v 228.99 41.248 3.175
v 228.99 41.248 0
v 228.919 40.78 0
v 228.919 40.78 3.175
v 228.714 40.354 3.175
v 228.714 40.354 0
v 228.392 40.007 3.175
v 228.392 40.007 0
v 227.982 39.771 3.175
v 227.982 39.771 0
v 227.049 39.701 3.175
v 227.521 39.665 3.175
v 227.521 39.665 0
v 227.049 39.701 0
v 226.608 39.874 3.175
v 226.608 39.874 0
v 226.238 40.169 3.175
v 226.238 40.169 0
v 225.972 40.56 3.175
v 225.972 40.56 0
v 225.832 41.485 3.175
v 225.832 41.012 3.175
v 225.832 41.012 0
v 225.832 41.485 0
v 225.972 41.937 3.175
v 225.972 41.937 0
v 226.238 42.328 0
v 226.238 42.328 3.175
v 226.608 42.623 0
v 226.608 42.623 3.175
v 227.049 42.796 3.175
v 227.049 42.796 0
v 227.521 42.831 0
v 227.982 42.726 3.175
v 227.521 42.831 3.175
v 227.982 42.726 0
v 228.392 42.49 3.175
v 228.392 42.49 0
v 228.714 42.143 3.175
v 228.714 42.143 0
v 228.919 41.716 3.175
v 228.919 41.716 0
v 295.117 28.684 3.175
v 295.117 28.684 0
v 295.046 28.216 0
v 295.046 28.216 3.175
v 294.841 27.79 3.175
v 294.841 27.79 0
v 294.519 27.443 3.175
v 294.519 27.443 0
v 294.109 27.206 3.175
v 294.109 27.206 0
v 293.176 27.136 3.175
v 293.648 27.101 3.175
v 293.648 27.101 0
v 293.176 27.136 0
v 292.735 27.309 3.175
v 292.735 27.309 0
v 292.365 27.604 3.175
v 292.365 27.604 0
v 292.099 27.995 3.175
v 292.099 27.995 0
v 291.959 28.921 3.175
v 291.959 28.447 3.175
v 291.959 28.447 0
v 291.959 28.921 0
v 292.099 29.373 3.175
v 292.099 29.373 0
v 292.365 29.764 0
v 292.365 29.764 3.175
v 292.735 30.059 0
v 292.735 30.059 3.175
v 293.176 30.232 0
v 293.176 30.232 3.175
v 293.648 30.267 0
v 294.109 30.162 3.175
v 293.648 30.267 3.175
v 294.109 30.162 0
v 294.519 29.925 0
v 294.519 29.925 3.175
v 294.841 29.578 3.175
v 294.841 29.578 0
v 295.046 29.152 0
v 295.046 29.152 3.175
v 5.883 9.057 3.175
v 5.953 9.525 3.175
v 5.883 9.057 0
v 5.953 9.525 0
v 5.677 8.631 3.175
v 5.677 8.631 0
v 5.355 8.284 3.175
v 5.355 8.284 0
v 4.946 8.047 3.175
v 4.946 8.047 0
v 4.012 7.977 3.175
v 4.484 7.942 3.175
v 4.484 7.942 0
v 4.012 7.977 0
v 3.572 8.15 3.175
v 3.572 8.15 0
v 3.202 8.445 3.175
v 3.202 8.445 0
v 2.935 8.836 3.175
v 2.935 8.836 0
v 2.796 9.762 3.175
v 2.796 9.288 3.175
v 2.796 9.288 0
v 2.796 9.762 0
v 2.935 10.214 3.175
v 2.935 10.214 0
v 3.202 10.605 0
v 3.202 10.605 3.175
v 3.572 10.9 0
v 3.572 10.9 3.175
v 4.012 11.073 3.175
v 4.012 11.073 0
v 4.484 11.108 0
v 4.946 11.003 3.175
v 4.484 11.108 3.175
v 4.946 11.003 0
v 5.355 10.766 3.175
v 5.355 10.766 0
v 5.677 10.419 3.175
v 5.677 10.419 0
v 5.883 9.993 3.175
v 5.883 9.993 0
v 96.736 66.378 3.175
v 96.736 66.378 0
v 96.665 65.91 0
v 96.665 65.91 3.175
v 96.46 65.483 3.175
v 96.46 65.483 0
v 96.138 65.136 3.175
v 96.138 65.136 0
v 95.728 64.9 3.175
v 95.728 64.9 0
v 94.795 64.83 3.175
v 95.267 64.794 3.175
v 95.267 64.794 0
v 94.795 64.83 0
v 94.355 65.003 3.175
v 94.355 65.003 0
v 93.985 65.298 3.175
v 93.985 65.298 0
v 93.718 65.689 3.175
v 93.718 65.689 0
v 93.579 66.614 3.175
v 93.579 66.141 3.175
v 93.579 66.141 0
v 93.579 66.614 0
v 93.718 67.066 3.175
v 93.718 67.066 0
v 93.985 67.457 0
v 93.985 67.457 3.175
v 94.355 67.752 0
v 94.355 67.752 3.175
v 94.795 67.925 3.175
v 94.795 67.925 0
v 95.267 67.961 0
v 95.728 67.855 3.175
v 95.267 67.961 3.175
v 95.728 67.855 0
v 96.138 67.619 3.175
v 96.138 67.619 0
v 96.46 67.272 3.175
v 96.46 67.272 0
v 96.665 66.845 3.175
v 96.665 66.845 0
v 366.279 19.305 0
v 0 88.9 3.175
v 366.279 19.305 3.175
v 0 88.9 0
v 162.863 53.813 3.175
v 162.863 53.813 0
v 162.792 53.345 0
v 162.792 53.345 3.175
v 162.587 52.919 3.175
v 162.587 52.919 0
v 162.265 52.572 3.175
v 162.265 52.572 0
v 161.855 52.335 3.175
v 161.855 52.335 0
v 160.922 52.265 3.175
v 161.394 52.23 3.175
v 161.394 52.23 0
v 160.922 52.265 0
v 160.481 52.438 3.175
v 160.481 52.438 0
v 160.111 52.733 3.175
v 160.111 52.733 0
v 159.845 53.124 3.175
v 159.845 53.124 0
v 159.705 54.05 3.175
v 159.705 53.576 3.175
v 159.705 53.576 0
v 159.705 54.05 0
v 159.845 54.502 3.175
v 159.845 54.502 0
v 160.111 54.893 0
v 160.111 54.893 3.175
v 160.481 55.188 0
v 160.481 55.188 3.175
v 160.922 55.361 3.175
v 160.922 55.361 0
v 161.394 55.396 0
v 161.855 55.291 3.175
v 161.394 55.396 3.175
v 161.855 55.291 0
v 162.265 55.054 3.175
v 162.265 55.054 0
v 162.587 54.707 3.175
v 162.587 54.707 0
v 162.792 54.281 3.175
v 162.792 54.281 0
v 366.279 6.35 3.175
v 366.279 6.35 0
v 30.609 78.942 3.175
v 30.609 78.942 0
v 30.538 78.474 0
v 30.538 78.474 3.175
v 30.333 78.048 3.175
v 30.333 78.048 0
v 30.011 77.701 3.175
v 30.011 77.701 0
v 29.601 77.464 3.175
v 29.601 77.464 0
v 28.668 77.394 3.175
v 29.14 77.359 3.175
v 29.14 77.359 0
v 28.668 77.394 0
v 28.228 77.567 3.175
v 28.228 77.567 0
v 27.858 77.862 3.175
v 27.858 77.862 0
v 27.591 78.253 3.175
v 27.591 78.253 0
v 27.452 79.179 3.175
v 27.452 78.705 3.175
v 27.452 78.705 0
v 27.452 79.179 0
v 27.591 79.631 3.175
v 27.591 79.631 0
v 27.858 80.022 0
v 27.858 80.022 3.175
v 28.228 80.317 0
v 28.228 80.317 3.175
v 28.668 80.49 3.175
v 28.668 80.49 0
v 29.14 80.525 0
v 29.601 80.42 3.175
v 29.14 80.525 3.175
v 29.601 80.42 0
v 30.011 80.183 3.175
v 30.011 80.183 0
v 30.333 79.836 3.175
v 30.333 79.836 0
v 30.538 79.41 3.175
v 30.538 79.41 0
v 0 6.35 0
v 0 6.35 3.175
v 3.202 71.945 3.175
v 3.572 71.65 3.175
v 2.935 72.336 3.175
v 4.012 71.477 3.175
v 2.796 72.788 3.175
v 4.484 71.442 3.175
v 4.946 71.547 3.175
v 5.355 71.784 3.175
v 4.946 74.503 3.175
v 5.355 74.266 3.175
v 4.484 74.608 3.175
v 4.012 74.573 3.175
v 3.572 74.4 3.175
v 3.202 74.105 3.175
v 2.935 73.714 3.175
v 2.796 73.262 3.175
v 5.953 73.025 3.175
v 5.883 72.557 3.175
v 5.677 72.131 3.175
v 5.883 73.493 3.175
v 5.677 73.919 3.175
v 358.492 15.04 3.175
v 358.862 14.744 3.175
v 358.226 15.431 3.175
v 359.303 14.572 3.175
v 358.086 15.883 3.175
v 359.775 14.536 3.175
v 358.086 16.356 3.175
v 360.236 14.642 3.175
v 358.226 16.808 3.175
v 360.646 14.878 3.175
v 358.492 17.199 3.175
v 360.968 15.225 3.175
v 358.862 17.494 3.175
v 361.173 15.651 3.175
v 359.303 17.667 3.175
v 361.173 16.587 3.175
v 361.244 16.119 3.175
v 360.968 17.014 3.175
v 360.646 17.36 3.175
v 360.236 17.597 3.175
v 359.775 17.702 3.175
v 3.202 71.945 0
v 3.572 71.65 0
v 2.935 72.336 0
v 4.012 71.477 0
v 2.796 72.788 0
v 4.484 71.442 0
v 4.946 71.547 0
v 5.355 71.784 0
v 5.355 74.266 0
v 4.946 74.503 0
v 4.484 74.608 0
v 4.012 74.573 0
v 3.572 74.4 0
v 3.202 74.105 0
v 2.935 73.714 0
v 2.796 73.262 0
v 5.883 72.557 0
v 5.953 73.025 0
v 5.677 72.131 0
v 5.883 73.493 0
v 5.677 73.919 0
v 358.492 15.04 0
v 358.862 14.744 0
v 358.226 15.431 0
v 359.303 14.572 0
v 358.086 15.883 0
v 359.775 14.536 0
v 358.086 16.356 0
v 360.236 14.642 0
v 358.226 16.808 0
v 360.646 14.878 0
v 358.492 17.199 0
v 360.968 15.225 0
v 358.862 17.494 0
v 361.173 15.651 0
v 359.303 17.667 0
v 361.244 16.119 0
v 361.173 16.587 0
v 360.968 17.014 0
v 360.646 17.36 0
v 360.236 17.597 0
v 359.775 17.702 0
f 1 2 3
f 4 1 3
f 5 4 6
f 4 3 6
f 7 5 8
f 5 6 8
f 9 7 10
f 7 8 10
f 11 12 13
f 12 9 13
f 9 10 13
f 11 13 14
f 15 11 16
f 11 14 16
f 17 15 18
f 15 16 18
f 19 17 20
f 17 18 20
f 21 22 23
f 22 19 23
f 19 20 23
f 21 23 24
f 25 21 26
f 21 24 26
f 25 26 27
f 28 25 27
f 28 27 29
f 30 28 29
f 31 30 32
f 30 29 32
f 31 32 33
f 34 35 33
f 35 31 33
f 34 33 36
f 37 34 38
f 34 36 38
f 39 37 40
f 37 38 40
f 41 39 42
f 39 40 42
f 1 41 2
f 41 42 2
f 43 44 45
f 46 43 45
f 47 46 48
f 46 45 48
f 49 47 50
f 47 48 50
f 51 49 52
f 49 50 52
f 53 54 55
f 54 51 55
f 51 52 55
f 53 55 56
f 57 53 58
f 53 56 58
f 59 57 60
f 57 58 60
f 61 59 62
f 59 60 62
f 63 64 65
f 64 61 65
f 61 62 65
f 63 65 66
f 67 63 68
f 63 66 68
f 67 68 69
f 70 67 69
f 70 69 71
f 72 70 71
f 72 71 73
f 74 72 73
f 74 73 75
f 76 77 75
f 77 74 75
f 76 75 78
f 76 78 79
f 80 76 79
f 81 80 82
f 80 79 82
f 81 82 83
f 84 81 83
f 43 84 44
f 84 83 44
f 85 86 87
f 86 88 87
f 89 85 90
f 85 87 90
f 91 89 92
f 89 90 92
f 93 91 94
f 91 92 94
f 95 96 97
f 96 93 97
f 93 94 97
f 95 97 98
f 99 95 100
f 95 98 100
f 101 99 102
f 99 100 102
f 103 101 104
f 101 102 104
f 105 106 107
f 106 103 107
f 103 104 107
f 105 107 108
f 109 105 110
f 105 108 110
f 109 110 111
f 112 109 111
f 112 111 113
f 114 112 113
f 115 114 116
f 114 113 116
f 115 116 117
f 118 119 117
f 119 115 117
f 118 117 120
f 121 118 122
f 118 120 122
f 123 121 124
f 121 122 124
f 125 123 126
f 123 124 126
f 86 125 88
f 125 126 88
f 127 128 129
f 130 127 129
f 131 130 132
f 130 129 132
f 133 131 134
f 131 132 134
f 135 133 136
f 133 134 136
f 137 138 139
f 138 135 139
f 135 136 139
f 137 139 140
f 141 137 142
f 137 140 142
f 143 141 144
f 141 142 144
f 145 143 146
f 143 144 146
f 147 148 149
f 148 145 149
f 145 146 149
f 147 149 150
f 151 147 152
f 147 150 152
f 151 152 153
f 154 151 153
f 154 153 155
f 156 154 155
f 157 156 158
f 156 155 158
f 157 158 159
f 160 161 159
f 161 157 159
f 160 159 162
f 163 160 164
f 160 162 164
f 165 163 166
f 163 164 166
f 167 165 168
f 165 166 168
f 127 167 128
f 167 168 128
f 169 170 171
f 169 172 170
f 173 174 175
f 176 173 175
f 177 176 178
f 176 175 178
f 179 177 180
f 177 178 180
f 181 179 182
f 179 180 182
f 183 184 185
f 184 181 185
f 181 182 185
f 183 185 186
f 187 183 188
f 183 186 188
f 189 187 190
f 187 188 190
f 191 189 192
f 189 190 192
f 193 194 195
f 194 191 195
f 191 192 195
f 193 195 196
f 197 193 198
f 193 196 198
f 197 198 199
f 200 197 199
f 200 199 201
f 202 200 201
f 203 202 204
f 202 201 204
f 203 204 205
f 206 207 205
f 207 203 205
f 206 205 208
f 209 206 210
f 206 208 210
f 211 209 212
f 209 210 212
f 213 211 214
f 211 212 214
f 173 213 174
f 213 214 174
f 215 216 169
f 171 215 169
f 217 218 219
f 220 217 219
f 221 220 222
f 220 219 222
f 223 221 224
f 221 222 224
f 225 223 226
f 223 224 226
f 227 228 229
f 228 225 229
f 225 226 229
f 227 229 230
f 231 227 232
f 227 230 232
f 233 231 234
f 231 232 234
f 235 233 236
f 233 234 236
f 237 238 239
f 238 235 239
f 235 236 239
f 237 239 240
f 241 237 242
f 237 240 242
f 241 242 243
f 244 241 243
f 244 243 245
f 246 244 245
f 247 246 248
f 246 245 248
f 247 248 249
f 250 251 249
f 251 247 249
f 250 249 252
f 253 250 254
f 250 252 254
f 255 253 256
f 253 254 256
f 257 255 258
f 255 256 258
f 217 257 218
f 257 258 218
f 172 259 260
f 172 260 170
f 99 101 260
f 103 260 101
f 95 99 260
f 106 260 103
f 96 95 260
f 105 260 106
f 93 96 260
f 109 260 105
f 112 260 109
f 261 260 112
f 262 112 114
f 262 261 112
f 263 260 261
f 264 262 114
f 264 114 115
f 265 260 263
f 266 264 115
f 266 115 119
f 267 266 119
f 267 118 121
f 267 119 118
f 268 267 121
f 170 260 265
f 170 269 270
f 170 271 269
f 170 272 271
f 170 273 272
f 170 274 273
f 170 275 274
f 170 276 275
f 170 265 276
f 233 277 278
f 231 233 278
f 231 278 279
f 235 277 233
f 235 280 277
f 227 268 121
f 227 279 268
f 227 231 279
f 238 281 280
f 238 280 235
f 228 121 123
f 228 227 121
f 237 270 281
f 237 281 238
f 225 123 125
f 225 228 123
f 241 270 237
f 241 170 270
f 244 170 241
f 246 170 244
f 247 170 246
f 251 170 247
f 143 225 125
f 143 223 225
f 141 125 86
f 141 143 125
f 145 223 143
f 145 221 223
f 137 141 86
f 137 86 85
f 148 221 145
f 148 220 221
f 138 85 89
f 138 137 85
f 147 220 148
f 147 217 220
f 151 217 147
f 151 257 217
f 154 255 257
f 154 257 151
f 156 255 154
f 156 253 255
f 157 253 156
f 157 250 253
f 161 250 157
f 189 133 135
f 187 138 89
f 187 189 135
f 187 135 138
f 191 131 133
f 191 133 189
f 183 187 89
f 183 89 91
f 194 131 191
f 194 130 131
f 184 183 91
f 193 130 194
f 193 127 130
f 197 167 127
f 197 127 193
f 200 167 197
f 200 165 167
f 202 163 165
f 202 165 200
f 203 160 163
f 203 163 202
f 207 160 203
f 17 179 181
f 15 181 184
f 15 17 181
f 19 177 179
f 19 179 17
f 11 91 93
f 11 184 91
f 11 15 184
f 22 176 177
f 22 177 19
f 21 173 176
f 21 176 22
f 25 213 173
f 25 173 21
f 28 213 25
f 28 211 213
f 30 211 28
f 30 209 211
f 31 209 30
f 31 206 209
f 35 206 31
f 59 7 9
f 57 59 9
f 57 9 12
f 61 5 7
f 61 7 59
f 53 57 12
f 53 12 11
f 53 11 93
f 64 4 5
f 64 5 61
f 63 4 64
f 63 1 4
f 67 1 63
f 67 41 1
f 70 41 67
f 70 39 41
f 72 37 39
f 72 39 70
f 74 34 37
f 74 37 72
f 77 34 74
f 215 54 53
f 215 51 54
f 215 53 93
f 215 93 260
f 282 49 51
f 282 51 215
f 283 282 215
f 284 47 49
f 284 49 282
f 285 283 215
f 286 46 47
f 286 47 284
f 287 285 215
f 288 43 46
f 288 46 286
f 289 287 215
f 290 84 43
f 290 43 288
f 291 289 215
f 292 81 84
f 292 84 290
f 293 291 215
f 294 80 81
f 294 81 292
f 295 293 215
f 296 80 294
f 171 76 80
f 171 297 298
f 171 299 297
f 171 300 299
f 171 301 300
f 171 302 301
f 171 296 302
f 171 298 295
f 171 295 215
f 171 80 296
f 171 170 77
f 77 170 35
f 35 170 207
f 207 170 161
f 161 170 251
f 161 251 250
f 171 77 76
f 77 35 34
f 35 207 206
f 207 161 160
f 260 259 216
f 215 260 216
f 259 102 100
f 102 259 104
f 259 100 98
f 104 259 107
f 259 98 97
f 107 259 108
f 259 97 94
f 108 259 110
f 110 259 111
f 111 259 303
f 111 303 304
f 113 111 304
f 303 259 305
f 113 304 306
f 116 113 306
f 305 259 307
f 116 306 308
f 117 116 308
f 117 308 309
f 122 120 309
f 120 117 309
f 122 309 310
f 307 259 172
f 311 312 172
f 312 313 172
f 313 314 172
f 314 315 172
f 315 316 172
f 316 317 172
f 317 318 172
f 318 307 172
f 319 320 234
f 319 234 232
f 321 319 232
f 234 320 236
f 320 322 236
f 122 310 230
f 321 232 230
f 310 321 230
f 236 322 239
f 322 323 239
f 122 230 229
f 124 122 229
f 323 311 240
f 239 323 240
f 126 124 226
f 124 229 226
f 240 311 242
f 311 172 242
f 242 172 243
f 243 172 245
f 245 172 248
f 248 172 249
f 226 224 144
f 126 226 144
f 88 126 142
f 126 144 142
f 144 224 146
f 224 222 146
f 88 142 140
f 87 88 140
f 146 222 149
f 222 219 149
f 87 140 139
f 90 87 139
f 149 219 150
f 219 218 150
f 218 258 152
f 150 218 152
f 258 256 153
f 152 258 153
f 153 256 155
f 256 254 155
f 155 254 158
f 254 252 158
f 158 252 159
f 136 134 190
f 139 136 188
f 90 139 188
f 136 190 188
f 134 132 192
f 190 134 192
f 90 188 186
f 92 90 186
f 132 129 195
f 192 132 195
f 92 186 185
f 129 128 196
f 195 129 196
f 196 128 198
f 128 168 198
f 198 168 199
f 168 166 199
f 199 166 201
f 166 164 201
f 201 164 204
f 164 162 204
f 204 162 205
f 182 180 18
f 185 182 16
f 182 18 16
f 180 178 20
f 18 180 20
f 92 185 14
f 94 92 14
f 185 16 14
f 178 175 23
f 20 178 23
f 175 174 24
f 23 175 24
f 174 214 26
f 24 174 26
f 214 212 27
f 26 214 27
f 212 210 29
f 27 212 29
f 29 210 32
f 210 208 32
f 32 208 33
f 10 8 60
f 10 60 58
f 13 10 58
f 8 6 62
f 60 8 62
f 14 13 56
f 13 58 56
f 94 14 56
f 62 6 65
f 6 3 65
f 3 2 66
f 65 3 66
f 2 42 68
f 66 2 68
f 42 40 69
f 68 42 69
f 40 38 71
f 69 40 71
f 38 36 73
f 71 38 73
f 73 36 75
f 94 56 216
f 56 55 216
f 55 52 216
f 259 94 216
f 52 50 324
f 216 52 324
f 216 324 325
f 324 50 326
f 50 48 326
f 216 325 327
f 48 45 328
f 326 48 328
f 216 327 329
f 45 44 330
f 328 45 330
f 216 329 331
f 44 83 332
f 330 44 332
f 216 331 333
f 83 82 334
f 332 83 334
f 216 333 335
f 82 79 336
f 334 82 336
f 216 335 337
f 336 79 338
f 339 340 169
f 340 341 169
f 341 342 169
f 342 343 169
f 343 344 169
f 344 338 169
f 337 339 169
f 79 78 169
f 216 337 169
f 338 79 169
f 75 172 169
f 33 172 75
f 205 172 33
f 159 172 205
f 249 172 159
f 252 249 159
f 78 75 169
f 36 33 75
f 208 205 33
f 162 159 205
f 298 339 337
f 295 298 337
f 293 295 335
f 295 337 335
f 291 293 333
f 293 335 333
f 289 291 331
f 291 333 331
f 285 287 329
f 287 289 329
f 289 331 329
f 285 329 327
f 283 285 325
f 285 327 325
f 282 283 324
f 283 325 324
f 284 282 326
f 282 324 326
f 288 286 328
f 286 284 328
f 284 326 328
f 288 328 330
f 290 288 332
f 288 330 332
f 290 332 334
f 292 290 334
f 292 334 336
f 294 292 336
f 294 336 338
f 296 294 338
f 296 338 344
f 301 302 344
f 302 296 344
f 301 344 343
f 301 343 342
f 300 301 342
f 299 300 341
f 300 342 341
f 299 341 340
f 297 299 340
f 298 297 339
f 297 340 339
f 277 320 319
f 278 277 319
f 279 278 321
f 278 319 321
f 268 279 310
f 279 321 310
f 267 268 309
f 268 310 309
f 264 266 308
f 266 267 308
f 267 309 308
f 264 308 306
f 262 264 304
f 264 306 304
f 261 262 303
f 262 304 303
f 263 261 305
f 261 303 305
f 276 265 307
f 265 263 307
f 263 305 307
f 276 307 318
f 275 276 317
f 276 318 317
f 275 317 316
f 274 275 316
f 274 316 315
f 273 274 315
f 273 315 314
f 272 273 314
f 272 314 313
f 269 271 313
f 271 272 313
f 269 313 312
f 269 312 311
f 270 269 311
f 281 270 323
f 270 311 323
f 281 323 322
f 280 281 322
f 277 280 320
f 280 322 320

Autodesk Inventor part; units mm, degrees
ref_plane "YZ Plane" through (0, 0, 0) normal (1, 0, 0) x (0, 1, 0)
ref_plane "XZ Plane" through (0, 0, 0) normal (0, 1, 0) x (-1, 0, 0)
ref_plane "XY Plane" through (0, 0, 0) normal (0, 0, 1) x (1, 0, 0)
sketch "Sketch1" plane through (0, 0, 0) normal (0, 0, 1) x (1, 0, 0)
  line L0 (0, 0) -> (0, 88.9)
  line L1 (0, 88.9) -> (366.2791, 19.3046)
  line L2 (467.8791, 0) -> (366.2791, 0) construction
  line L3 (366.2791, 0) -> (366.2791, 19.3046)
  line L4 (366.2791, 19.3046) -> (467.8791, 0) construction
  line L5 (366.2791, 0) -> (0, 0)
  line L6 (0, 6.35) -> (366.2791, 6.35)
  circle A0 centre (4.3656, 73.025) radius 1.5875 projected
  circle A1 centre (4.3656, 9.525) radius 1.5875 projected
  line L7 (11.9063, 82.55) -> (-3.9687, 82.55) construction
  line L8 (11.9063, 82.55) -> (11.9063, 0) construction
  line L9 (-3.9687, 0) -> (11.9063, 0) construction
  line L10 (-3.9687, 82.55) -> (-3.9687, 0) construction
  circle A2 centre (293.5291, 28.6839) radius 1.5875 projected
  circle A3 centre (161.2752, 53.8129) radius 1.5875 projected
  circle A4 centre (29.0214, 78.942) radius 1.5875 projected
  circle A5 centre (95.1483, 66.3775) radius 1.5875 projected
  circle A6 centre (227.4022, 41.2484) radius 1.5875 projected
  circle A7 centre (359.656, 16.1193) radius 1.5875 projected
  line L11 (21.2196, 88.9079) -> (18.2563, 73.3119) construction
  line L12 (21.2196, 88.9079) -> (370.5693, 22.5292) construction
  line L13 (367.606, 6.9333) -> (370.5693, 22.5292) construction
  line L14 (18.2563, 73.3119) -> (367.606, 6.9333) construction
  dimension "d0" = 88.9
  dimension "d1" = 476.25
  dimension "d5" = 101.6
  dimension "d6" = 6.35
extrude "Extrusion1" add sketch "Sketch1" along normal blind 3.175 contours L0 L1 L3 L6
properties part number "Hopper Back Wedge Side" material "Polycarbonate, Clear"
